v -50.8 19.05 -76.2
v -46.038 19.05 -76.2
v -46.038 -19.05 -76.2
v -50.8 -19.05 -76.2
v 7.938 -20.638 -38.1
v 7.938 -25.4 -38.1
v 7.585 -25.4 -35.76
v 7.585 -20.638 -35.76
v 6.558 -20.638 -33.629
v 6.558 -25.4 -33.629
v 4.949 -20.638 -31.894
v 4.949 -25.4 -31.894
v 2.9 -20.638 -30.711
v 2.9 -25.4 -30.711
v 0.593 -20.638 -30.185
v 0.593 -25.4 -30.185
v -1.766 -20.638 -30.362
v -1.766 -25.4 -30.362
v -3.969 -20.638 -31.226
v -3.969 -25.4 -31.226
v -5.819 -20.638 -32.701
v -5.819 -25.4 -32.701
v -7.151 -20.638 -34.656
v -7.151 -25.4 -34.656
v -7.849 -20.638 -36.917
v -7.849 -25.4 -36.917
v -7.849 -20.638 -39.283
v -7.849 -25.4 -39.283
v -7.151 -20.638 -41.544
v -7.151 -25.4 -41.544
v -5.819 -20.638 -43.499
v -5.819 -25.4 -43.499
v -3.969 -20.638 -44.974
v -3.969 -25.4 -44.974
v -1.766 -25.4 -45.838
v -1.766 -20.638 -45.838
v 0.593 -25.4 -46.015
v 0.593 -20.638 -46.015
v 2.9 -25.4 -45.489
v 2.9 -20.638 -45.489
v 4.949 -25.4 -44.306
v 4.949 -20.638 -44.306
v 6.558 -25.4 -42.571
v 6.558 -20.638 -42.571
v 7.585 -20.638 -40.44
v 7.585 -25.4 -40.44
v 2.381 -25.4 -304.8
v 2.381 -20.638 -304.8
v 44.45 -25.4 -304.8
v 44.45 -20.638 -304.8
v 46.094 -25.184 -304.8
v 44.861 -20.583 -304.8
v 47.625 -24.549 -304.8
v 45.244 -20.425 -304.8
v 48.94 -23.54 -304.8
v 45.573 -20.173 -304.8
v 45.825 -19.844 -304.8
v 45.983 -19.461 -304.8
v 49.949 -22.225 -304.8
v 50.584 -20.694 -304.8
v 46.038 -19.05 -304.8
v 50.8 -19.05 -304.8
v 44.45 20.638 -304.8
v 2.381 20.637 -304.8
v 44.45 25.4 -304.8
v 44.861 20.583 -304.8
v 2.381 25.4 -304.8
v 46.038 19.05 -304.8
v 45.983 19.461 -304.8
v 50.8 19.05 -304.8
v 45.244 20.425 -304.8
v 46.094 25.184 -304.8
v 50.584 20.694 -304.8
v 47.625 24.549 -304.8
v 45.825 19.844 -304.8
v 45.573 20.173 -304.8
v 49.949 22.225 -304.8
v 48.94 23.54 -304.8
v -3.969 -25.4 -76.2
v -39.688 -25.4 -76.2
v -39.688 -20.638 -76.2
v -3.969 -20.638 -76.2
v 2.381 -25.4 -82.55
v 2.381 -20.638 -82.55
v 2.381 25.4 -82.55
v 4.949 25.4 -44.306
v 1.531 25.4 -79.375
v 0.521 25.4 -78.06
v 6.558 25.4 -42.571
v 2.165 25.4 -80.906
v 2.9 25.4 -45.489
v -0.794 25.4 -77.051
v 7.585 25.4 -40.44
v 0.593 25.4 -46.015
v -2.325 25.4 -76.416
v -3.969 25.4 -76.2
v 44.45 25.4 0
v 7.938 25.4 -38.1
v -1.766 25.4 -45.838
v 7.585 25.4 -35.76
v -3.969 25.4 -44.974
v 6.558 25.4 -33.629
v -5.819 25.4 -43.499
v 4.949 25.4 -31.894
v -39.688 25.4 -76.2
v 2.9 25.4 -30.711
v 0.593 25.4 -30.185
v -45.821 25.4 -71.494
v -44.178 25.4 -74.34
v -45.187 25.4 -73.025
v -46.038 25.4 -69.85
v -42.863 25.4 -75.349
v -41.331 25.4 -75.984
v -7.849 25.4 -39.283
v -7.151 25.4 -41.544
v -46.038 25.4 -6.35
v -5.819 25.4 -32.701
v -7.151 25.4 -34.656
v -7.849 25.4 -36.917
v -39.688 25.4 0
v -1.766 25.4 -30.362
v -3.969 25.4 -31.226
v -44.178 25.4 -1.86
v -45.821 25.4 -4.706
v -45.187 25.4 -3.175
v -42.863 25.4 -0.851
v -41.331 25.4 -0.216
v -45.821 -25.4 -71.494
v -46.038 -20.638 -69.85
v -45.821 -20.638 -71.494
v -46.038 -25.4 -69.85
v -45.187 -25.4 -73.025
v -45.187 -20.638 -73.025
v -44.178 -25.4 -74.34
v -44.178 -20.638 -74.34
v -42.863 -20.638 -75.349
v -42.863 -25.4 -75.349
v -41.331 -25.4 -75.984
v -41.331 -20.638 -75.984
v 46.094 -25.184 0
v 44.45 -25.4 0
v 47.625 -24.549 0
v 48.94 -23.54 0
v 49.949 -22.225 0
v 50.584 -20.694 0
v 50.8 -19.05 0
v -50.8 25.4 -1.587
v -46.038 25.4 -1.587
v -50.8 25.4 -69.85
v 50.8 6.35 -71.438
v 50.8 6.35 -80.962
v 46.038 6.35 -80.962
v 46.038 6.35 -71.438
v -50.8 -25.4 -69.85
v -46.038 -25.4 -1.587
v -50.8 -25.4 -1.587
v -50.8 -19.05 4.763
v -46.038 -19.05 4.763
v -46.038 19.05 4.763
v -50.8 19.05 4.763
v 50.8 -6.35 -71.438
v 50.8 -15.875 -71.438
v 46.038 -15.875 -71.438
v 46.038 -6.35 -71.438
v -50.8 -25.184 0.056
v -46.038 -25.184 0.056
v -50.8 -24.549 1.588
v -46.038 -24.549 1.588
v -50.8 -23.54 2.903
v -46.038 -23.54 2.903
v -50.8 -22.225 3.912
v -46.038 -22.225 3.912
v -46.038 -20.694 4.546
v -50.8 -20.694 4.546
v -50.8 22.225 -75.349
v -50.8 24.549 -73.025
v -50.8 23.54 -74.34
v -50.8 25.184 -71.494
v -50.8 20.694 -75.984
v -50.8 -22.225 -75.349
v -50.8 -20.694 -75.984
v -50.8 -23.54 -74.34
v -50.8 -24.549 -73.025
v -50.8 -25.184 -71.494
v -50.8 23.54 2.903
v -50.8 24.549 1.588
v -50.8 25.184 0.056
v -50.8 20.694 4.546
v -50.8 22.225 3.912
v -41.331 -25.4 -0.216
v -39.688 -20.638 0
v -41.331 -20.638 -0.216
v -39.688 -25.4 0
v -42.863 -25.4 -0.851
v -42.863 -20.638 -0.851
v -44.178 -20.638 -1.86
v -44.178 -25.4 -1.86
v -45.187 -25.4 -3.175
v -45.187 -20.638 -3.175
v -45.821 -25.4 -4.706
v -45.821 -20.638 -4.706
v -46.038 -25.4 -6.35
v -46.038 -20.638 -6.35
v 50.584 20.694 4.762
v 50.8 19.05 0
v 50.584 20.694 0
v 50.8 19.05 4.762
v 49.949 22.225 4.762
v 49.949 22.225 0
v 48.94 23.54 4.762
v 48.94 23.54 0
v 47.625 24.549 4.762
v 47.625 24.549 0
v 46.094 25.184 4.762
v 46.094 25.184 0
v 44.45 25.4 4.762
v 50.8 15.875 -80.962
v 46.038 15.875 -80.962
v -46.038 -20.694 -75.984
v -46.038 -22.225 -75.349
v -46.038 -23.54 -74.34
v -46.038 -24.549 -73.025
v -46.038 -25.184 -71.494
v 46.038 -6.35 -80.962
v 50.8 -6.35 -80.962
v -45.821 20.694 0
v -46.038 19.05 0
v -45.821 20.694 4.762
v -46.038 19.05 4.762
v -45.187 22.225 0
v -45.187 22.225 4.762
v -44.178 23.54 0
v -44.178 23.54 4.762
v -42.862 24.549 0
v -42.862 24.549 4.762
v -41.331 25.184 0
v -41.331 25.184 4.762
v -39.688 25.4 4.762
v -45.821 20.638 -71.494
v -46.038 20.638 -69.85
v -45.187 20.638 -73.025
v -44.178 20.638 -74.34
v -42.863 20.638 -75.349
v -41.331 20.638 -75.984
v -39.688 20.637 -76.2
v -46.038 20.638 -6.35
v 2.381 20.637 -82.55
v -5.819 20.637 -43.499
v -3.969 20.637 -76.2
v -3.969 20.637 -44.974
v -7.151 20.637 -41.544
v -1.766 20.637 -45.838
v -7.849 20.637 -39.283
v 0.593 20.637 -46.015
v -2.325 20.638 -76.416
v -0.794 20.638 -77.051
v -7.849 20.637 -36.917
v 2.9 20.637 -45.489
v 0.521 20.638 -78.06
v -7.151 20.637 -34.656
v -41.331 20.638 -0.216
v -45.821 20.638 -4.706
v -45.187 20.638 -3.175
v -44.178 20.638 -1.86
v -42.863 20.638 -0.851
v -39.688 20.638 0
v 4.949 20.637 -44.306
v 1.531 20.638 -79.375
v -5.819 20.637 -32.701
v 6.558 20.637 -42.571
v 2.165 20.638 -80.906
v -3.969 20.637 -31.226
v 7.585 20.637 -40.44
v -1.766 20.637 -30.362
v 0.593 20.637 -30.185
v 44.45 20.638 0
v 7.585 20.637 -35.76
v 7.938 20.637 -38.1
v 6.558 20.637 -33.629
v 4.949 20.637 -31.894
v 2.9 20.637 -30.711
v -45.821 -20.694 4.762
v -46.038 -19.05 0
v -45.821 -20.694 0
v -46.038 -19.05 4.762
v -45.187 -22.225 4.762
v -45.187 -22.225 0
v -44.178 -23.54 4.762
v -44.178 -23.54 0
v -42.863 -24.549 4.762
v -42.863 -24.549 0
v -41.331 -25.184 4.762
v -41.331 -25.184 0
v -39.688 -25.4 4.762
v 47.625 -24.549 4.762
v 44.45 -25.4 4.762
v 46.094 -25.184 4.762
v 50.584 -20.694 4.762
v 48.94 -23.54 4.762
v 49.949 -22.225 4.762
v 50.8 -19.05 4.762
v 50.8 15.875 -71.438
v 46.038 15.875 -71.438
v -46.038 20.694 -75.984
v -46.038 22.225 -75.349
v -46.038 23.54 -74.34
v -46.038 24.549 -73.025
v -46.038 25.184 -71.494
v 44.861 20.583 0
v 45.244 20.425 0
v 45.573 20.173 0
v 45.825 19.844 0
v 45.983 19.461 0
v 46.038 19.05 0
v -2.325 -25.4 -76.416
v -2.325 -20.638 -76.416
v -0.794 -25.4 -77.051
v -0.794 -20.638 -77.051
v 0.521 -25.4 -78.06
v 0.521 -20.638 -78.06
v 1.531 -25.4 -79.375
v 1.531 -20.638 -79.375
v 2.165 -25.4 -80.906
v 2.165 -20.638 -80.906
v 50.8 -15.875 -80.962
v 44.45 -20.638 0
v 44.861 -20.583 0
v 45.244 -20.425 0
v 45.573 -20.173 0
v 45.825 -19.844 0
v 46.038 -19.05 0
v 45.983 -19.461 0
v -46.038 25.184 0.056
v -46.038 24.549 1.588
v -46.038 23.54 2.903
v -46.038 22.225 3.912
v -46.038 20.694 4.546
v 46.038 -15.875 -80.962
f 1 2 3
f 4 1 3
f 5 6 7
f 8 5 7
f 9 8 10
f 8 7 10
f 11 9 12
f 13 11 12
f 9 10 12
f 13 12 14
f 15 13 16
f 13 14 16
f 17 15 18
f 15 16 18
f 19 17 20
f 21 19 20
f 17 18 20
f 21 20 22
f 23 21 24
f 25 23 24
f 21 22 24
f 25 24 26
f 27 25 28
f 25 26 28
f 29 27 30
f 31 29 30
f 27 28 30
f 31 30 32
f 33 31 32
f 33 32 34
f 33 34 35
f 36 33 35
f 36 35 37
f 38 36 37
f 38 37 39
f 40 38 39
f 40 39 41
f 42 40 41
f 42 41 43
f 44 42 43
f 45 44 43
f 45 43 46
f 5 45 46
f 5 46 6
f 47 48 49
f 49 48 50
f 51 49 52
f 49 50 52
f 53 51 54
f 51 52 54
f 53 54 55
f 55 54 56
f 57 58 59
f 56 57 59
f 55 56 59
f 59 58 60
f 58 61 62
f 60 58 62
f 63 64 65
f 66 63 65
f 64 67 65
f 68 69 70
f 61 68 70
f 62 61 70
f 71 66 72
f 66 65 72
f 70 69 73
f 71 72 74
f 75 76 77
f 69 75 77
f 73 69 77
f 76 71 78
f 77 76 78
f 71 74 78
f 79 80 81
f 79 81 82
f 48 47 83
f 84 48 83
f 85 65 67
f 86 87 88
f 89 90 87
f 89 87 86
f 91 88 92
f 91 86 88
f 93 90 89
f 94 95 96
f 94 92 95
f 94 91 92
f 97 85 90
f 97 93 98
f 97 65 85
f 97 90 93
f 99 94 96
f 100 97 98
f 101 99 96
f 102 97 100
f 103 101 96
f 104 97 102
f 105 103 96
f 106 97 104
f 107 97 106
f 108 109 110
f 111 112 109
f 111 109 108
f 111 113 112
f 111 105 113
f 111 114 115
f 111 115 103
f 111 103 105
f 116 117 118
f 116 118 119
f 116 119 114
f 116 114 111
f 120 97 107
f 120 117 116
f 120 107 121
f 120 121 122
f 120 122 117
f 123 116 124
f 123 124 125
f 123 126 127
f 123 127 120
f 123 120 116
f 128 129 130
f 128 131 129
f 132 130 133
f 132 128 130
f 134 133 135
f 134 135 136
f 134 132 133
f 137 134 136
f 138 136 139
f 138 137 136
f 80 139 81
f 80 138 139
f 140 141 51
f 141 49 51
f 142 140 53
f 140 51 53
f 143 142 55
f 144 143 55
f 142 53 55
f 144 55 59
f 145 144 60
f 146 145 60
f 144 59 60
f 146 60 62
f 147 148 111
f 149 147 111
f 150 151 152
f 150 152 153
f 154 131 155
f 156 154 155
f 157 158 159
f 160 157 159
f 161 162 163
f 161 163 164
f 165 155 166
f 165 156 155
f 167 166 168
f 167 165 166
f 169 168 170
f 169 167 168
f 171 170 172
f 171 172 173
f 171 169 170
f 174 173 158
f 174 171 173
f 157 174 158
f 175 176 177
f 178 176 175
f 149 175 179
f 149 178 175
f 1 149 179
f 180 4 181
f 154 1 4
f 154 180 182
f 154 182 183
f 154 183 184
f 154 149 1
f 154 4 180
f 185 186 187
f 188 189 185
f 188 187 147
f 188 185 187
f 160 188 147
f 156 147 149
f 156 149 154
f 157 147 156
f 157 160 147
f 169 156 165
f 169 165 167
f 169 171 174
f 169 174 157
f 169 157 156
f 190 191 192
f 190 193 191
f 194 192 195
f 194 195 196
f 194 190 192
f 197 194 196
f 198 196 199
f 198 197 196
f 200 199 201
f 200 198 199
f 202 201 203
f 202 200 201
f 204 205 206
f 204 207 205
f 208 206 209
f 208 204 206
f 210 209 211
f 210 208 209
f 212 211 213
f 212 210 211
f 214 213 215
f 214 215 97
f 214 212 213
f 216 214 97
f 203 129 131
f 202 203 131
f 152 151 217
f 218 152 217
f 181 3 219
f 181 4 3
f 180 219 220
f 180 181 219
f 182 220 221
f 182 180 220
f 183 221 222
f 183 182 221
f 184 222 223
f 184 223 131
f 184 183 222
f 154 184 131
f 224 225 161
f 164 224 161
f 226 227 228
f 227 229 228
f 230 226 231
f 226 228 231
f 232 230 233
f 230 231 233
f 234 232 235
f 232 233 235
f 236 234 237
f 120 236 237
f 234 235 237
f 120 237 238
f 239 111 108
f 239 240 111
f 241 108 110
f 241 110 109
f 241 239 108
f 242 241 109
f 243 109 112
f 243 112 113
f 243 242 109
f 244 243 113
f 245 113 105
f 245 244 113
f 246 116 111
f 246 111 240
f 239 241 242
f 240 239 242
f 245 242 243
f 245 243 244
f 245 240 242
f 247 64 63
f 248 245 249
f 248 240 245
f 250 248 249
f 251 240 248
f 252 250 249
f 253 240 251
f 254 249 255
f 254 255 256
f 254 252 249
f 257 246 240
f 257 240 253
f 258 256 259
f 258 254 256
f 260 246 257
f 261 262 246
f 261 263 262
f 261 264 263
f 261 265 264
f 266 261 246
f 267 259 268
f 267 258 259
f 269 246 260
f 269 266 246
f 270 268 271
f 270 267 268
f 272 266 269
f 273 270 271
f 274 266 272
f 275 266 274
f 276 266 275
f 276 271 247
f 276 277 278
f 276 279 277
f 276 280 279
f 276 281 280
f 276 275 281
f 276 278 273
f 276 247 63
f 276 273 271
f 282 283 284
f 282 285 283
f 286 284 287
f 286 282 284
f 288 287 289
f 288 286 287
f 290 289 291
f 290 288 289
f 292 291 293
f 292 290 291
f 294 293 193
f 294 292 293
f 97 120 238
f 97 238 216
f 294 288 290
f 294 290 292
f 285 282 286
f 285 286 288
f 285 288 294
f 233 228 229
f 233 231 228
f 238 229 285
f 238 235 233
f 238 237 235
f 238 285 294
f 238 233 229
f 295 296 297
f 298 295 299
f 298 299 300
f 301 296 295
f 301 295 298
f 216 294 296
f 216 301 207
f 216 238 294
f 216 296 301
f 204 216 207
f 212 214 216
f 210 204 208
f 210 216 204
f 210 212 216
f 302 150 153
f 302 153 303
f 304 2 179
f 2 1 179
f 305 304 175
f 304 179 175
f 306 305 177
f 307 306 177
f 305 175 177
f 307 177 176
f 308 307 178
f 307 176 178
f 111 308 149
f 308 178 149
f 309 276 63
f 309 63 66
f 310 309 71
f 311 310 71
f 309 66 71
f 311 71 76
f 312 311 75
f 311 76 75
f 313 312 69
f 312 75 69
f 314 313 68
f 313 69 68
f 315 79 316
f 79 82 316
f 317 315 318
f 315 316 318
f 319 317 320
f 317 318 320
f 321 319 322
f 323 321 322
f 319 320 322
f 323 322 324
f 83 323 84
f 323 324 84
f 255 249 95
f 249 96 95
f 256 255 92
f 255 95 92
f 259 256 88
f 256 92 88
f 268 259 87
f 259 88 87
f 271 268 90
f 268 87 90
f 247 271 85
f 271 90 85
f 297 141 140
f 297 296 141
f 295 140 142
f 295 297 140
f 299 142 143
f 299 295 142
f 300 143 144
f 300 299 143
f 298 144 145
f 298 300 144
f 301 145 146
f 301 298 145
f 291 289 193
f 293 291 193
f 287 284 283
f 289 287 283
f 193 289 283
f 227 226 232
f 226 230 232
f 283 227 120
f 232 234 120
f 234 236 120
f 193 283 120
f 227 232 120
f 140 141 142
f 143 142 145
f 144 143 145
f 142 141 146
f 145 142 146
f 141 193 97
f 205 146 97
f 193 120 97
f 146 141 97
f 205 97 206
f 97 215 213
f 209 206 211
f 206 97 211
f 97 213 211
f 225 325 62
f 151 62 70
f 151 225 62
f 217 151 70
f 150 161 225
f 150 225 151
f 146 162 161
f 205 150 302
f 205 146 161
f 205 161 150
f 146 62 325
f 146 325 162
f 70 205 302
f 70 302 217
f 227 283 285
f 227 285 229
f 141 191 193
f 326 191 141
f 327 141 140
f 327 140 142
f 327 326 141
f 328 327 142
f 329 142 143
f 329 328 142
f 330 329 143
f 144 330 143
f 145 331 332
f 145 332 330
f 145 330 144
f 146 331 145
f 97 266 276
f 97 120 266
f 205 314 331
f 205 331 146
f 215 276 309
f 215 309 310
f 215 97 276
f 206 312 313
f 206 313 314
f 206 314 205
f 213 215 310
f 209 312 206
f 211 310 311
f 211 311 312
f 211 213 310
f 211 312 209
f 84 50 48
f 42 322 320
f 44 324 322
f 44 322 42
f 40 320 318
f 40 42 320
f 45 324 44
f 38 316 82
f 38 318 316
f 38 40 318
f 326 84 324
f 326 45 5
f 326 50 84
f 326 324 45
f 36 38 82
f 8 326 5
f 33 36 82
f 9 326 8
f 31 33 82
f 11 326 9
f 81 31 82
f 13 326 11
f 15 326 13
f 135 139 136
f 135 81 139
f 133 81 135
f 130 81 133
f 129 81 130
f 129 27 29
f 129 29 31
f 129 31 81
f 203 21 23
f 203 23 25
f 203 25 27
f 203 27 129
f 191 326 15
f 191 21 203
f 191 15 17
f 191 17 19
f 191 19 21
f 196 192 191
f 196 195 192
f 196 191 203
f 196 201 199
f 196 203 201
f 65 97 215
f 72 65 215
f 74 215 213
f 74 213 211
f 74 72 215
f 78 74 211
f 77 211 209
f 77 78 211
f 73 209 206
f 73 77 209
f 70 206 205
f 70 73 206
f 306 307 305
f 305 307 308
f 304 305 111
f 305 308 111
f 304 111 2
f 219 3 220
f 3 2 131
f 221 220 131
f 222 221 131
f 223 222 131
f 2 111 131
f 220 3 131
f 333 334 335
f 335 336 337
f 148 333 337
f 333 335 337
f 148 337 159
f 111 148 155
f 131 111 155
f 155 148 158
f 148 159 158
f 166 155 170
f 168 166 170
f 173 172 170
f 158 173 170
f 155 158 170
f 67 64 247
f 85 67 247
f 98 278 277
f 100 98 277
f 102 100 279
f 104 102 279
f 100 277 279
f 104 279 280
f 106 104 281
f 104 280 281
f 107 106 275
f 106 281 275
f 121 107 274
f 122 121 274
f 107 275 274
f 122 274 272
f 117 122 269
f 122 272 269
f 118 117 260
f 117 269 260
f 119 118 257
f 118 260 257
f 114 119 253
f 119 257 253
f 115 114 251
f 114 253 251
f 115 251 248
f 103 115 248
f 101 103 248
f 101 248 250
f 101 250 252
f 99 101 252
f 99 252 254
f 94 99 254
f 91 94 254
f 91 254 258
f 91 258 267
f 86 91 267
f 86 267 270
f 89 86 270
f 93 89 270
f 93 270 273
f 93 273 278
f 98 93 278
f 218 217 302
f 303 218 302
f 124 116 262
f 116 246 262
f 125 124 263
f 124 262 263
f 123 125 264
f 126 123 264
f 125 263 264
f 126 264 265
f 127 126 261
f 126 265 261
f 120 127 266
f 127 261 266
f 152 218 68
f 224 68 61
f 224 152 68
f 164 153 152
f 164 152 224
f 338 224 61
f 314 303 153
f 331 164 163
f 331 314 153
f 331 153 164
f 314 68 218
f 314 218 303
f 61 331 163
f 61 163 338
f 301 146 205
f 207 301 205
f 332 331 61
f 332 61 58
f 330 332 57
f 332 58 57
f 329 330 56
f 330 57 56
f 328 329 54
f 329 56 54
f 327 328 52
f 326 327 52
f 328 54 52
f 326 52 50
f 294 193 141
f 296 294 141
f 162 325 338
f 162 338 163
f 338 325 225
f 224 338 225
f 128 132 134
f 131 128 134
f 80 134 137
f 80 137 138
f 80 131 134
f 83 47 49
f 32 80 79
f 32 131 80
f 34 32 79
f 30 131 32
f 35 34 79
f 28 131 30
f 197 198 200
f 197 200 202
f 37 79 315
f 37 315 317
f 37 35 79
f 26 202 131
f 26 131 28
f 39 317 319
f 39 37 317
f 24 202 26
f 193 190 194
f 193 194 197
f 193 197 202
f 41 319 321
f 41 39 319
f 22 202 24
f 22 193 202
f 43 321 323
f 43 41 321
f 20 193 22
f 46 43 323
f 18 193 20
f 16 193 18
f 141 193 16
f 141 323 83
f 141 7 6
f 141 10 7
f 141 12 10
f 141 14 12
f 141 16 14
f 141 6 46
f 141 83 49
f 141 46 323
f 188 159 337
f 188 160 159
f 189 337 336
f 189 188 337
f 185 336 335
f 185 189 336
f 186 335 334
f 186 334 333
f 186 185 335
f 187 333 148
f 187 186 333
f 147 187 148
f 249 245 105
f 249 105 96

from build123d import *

# Parameters (mm, degrees)
F1_DEPTH  = 304.8
F2_W      = 9.525
F2_H      = 9.525
F3_DEPTH  = 96.8385
F4_W      = 106.9017795086
F4_H      = 228.6
F5_DEPTH  = 50.8
F6_W      = 96.8375
F6_H      = 50.8
F7_DEPTH  = 4.7625
F9_DEPTH  = 4.7625
F10_R     = 7.9375
F11_DEPTH = 50.8
F12_R     = 6.35
F12_2_R   = 6.35
F13_R     = 6.35
F14_R     = 1.5875


with BuildPart() as f1:
    # F0 (on Top) → F1 (new body)
    with BuildSketch(Plane.XY):
        Polygon((-46.0375, 25.4), (-46.0375, 20.6375), (46.0375, 20.6375), (46.0375, -20.6375), (-46.0375, -20.6375), (-46.0375, -25.4), (50.8, -25.4), (50.8, 25.4), align=None)
    extrude(amount=-F1_DEPTH)

    # F2 (on face) → F3 (cut, through all)
    with BuildSketch(Plane.YZ.offset(50.8)):
        with Locations((-11.1125, -76.2)):
            Rectangle(F2_W, F2_H)
        with Locations((11.1125, -76.2)):
            Rectangle(F2_W, F2_H)
    extrude(amount=-F3_DEPTH, mode=Mode.SUBTRACT)

    # F4 (on face) → F5 (cut)
    with BuildSketch(Plane.XZ.offset(25.4)):
        with Locations((-51.0696397543, -190.5)):
            Rectangle(F4_W, F4_H)
    extrude(amount=-F5_DEPTH, mode=Mode.SUBTRACT)

    # F10 (on face) → F11 (cut, through all)
    with BuildSketch(Plane.XZ.offset(25.4)):
        with Locations((0, -38.1)):
            Circle(F10_R)
    extrude(amount=-F11_DEPTH, mode=Mode.SUBTRACT)

    # F13
    f13_edges = [f1.edges().sort_by_distance(p)[0] for p in [
        (50.8, -25.4, -152.4),
        (50.8, 25.4, -152.4),
        (2.38125, 23.01875, -76.2),
        (2.38125, -23.01875, -76.2),
        (-46.0375, 23.01875, -76.2),
        (-46.0375, -23.01875, -76.2),
        (-46.0375, -23.01875, 0),
        (-46.0375, 23.01875, 0),
    ]]
    fillet(f13_edges, radius=F13_R)

    # F14
    f14_edges = [f1.edges().sort_by_distance(p)[0] for p in [
        (46.0375, 20.6375, -152.4),
        (46.0375, -20.6375, -152.4),
    ]]
    fillet(f14_edges, radius=F14_R)


with BuildPart() as f7:
    # F6 (on Top) → F7 (new body)
    with BuildSketch(Plane.XY):
        with Locations((2.38125, 0)):
            Rectangle(F6_W, F6_H)
    extrude(amount=F7_DEPTH)

    # F12#2
    f12_2_edges = [f7.edges().sort_by_distance(p)[0] for p in [
        (-46.0375, 25.4, 2.38125),
        (-46.0375, -25.4, 2.38125),
        (50.8, -25.4, 2.38125),
        (50.8, 25.4, 2.38125),
    ]]
    fillet(f12_2_edges, radius=F12_2_R)


with BuildPart() as f9:
    # F8 (on face) → F9 (new body)
    with BuildSketch(Plane(origin=(-46.0375, 0, 0), x_dir=(0, -1, 0), z_dir=(-1, 0, 0))):
        Polygon((-25.4, 0), (-25.4, -76.2), (25.4, -76.2), (25.4, 0), (25.4, 4.7625), (-25.4, 4.7625), align=None)
    extrude(amount=F9_DEPTH)

    # F12
    f12_edges = [f9.edges().sort_by_distance(p)[0] for p in [
        (-48.41875, -25.4, 4.7625),
        (-48.41875, 25.4, 4.7625),
        (-48.41875, -25.4, -76.2),
        (-48.41875, 25.4, -76.2),
    ]]
    fillet(f12_edges, radius=F12_R)


solid = Compound([f1.part, f7.part, f9.part])
